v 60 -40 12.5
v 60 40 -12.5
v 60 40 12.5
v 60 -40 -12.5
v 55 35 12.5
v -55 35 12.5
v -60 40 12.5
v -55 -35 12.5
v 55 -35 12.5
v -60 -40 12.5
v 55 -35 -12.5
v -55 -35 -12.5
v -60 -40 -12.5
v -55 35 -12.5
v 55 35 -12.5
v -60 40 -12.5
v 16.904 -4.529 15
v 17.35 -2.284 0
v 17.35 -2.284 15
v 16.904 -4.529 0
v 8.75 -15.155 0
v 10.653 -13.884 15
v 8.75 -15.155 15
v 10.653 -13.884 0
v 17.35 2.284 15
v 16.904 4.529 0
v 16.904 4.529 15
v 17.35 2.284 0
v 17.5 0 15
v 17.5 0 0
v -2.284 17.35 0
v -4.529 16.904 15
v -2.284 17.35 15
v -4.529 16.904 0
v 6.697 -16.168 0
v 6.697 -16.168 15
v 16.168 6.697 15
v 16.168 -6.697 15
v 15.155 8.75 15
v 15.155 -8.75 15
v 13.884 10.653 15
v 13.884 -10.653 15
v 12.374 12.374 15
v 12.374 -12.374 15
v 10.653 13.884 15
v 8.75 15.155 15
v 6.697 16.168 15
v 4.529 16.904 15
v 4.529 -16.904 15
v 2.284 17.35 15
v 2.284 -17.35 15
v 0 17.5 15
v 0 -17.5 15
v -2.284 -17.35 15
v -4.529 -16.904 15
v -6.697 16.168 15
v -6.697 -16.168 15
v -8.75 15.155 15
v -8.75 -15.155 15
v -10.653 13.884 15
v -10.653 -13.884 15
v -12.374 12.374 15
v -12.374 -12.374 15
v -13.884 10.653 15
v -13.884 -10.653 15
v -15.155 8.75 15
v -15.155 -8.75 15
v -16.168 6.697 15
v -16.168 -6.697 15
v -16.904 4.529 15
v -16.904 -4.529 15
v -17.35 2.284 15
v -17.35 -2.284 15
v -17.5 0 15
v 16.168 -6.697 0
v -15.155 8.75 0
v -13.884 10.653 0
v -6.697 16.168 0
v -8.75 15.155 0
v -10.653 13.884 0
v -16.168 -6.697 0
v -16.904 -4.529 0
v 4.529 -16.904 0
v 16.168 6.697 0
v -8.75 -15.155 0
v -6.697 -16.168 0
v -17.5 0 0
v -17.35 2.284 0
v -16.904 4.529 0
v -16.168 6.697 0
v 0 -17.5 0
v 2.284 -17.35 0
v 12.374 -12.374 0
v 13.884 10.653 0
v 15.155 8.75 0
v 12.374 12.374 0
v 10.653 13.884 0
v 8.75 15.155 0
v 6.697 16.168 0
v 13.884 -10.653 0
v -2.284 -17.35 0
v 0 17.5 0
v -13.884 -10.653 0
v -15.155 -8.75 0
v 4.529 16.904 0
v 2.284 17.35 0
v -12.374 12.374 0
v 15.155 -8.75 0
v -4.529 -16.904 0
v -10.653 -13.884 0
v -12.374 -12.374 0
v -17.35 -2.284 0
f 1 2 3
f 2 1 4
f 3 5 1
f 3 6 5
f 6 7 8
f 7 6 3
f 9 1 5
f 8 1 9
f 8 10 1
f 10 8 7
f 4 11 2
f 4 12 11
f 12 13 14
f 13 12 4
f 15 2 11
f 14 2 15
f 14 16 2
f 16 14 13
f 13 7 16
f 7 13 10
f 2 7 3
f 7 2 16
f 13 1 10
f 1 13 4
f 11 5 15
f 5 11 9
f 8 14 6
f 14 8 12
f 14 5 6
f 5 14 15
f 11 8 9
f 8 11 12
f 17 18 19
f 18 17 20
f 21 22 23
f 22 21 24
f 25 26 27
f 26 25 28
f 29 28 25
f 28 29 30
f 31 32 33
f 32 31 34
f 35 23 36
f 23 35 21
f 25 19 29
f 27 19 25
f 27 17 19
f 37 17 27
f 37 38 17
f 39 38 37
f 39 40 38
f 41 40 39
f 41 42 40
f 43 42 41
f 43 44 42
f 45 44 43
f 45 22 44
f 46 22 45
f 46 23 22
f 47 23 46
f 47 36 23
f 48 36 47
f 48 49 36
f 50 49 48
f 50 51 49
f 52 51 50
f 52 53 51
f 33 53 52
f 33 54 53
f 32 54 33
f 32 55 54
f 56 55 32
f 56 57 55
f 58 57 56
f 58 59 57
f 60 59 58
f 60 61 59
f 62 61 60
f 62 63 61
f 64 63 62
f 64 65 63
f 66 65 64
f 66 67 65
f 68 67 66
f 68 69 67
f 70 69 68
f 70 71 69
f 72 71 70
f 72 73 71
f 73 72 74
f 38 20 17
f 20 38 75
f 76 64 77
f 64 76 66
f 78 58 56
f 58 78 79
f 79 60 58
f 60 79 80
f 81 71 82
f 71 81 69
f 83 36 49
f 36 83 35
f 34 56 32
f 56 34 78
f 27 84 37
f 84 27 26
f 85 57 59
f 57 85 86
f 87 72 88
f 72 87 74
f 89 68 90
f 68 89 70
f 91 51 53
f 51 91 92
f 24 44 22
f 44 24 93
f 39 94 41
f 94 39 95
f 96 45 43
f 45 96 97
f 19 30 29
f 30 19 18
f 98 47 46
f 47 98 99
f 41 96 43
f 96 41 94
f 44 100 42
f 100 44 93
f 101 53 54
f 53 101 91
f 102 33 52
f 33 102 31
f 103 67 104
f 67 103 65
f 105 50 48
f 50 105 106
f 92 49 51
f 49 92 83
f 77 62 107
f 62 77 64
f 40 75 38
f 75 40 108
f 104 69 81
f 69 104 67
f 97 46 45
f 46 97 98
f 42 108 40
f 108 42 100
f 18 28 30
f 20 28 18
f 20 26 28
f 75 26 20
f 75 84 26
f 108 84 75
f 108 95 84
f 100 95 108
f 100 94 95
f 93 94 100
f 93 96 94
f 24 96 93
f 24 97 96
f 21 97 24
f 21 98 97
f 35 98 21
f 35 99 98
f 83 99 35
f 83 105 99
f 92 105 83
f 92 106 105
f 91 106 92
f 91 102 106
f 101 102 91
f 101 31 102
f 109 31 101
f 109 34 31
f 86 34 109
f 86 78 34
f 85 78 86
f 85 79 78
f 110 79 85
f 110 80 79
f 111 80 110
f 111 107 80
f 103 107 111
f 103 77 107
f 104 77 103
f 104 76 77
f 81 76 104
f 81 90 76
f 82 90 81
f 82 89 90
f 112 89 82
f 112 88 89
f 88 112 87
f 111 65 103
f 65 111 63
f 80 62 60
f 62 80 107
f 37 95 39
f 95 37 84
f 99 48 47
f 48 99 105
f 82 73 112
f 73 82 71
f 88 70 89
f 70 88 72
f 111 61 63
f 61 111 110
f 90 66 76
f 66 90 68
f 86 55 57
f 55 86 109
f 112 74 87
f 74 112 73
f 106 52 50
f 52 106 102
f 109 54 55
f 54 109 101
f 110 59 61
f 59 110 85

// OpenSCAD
// file: common/labels.scad
// Label zones for video explanation
module label_zone(name) {
  // placeholder for annotation in renders
  children();
}
// file: common/branding.scad
module gunnch_badge() {
  linear_extrude(badge_h) translate([0,0,0]) square([badge_w, badge_w/3], center=true);
}
// file: common/ports.scad
module usb_c_cutout() {
  translate([0,0,-1]) cube([9, 3.5, wall+2], center=true);
}
module usb_a_cutout() {
  translate([0,0,-1]) cube([12, 5, wall+2], center=true);
}
module audio_3_5_cutout() {
  translate([0,0,-1]) cylinder(h=wall+2, d=6, $fn=32);
}
// file: common/dimensions.scad
// Shared dimensions — EVT-0 concept only
wall = 2;
corner_r = 4;
badge_w = 12;
badge_h = 3;
// file: wearables/charger_case_concept.scad
difference(){cube([120,80,25],center=true); translate([0,0,2]) cube([110,70,30],center=true);}
// file: wearables/beacon_puck_concept.scad
module beacon_puck() { cylinder(h=15, d=35, $fn=48); }
beacon_puck();
// file: common_modules.scad
// EVT-1 common modules — dimensions/tolerances are placeholders, not final mechanical drawings
include <common/dimensions.scad>
include <common/ports.scad>
include <common/branding.scad>
include <common/labels.scad>

module screw_boss(r=2.5, h=6) { cylinder(r=r, h=h, $fn=24); }
module service_panel(w=40, h=20, t=2) { cube([w, h, t]); }
module cooling_vent(w=60, slots=5) {
  for (i=[0:slots-1]) translate([i*12-w/2, 0, 0]) cube([8, 2, 4], center=true);
}
module battery_compartment(w=80, d=60, h=8) { cube([w, d, h], center=true); }
module label_zone(w=30, h=10) { translate([0,0,0.1]) cube([w, h, 0.2]); }
// main file
// EVT-1 wearables arena set — placeholder assembly
// Dimensions/tolerances are EVT-1 placeholders, not final mechanical drawings
include <common_modules.scad>
include <wearables/beacon_puck_concept.scad>
include <wearables/charger_case_concept.scad>
